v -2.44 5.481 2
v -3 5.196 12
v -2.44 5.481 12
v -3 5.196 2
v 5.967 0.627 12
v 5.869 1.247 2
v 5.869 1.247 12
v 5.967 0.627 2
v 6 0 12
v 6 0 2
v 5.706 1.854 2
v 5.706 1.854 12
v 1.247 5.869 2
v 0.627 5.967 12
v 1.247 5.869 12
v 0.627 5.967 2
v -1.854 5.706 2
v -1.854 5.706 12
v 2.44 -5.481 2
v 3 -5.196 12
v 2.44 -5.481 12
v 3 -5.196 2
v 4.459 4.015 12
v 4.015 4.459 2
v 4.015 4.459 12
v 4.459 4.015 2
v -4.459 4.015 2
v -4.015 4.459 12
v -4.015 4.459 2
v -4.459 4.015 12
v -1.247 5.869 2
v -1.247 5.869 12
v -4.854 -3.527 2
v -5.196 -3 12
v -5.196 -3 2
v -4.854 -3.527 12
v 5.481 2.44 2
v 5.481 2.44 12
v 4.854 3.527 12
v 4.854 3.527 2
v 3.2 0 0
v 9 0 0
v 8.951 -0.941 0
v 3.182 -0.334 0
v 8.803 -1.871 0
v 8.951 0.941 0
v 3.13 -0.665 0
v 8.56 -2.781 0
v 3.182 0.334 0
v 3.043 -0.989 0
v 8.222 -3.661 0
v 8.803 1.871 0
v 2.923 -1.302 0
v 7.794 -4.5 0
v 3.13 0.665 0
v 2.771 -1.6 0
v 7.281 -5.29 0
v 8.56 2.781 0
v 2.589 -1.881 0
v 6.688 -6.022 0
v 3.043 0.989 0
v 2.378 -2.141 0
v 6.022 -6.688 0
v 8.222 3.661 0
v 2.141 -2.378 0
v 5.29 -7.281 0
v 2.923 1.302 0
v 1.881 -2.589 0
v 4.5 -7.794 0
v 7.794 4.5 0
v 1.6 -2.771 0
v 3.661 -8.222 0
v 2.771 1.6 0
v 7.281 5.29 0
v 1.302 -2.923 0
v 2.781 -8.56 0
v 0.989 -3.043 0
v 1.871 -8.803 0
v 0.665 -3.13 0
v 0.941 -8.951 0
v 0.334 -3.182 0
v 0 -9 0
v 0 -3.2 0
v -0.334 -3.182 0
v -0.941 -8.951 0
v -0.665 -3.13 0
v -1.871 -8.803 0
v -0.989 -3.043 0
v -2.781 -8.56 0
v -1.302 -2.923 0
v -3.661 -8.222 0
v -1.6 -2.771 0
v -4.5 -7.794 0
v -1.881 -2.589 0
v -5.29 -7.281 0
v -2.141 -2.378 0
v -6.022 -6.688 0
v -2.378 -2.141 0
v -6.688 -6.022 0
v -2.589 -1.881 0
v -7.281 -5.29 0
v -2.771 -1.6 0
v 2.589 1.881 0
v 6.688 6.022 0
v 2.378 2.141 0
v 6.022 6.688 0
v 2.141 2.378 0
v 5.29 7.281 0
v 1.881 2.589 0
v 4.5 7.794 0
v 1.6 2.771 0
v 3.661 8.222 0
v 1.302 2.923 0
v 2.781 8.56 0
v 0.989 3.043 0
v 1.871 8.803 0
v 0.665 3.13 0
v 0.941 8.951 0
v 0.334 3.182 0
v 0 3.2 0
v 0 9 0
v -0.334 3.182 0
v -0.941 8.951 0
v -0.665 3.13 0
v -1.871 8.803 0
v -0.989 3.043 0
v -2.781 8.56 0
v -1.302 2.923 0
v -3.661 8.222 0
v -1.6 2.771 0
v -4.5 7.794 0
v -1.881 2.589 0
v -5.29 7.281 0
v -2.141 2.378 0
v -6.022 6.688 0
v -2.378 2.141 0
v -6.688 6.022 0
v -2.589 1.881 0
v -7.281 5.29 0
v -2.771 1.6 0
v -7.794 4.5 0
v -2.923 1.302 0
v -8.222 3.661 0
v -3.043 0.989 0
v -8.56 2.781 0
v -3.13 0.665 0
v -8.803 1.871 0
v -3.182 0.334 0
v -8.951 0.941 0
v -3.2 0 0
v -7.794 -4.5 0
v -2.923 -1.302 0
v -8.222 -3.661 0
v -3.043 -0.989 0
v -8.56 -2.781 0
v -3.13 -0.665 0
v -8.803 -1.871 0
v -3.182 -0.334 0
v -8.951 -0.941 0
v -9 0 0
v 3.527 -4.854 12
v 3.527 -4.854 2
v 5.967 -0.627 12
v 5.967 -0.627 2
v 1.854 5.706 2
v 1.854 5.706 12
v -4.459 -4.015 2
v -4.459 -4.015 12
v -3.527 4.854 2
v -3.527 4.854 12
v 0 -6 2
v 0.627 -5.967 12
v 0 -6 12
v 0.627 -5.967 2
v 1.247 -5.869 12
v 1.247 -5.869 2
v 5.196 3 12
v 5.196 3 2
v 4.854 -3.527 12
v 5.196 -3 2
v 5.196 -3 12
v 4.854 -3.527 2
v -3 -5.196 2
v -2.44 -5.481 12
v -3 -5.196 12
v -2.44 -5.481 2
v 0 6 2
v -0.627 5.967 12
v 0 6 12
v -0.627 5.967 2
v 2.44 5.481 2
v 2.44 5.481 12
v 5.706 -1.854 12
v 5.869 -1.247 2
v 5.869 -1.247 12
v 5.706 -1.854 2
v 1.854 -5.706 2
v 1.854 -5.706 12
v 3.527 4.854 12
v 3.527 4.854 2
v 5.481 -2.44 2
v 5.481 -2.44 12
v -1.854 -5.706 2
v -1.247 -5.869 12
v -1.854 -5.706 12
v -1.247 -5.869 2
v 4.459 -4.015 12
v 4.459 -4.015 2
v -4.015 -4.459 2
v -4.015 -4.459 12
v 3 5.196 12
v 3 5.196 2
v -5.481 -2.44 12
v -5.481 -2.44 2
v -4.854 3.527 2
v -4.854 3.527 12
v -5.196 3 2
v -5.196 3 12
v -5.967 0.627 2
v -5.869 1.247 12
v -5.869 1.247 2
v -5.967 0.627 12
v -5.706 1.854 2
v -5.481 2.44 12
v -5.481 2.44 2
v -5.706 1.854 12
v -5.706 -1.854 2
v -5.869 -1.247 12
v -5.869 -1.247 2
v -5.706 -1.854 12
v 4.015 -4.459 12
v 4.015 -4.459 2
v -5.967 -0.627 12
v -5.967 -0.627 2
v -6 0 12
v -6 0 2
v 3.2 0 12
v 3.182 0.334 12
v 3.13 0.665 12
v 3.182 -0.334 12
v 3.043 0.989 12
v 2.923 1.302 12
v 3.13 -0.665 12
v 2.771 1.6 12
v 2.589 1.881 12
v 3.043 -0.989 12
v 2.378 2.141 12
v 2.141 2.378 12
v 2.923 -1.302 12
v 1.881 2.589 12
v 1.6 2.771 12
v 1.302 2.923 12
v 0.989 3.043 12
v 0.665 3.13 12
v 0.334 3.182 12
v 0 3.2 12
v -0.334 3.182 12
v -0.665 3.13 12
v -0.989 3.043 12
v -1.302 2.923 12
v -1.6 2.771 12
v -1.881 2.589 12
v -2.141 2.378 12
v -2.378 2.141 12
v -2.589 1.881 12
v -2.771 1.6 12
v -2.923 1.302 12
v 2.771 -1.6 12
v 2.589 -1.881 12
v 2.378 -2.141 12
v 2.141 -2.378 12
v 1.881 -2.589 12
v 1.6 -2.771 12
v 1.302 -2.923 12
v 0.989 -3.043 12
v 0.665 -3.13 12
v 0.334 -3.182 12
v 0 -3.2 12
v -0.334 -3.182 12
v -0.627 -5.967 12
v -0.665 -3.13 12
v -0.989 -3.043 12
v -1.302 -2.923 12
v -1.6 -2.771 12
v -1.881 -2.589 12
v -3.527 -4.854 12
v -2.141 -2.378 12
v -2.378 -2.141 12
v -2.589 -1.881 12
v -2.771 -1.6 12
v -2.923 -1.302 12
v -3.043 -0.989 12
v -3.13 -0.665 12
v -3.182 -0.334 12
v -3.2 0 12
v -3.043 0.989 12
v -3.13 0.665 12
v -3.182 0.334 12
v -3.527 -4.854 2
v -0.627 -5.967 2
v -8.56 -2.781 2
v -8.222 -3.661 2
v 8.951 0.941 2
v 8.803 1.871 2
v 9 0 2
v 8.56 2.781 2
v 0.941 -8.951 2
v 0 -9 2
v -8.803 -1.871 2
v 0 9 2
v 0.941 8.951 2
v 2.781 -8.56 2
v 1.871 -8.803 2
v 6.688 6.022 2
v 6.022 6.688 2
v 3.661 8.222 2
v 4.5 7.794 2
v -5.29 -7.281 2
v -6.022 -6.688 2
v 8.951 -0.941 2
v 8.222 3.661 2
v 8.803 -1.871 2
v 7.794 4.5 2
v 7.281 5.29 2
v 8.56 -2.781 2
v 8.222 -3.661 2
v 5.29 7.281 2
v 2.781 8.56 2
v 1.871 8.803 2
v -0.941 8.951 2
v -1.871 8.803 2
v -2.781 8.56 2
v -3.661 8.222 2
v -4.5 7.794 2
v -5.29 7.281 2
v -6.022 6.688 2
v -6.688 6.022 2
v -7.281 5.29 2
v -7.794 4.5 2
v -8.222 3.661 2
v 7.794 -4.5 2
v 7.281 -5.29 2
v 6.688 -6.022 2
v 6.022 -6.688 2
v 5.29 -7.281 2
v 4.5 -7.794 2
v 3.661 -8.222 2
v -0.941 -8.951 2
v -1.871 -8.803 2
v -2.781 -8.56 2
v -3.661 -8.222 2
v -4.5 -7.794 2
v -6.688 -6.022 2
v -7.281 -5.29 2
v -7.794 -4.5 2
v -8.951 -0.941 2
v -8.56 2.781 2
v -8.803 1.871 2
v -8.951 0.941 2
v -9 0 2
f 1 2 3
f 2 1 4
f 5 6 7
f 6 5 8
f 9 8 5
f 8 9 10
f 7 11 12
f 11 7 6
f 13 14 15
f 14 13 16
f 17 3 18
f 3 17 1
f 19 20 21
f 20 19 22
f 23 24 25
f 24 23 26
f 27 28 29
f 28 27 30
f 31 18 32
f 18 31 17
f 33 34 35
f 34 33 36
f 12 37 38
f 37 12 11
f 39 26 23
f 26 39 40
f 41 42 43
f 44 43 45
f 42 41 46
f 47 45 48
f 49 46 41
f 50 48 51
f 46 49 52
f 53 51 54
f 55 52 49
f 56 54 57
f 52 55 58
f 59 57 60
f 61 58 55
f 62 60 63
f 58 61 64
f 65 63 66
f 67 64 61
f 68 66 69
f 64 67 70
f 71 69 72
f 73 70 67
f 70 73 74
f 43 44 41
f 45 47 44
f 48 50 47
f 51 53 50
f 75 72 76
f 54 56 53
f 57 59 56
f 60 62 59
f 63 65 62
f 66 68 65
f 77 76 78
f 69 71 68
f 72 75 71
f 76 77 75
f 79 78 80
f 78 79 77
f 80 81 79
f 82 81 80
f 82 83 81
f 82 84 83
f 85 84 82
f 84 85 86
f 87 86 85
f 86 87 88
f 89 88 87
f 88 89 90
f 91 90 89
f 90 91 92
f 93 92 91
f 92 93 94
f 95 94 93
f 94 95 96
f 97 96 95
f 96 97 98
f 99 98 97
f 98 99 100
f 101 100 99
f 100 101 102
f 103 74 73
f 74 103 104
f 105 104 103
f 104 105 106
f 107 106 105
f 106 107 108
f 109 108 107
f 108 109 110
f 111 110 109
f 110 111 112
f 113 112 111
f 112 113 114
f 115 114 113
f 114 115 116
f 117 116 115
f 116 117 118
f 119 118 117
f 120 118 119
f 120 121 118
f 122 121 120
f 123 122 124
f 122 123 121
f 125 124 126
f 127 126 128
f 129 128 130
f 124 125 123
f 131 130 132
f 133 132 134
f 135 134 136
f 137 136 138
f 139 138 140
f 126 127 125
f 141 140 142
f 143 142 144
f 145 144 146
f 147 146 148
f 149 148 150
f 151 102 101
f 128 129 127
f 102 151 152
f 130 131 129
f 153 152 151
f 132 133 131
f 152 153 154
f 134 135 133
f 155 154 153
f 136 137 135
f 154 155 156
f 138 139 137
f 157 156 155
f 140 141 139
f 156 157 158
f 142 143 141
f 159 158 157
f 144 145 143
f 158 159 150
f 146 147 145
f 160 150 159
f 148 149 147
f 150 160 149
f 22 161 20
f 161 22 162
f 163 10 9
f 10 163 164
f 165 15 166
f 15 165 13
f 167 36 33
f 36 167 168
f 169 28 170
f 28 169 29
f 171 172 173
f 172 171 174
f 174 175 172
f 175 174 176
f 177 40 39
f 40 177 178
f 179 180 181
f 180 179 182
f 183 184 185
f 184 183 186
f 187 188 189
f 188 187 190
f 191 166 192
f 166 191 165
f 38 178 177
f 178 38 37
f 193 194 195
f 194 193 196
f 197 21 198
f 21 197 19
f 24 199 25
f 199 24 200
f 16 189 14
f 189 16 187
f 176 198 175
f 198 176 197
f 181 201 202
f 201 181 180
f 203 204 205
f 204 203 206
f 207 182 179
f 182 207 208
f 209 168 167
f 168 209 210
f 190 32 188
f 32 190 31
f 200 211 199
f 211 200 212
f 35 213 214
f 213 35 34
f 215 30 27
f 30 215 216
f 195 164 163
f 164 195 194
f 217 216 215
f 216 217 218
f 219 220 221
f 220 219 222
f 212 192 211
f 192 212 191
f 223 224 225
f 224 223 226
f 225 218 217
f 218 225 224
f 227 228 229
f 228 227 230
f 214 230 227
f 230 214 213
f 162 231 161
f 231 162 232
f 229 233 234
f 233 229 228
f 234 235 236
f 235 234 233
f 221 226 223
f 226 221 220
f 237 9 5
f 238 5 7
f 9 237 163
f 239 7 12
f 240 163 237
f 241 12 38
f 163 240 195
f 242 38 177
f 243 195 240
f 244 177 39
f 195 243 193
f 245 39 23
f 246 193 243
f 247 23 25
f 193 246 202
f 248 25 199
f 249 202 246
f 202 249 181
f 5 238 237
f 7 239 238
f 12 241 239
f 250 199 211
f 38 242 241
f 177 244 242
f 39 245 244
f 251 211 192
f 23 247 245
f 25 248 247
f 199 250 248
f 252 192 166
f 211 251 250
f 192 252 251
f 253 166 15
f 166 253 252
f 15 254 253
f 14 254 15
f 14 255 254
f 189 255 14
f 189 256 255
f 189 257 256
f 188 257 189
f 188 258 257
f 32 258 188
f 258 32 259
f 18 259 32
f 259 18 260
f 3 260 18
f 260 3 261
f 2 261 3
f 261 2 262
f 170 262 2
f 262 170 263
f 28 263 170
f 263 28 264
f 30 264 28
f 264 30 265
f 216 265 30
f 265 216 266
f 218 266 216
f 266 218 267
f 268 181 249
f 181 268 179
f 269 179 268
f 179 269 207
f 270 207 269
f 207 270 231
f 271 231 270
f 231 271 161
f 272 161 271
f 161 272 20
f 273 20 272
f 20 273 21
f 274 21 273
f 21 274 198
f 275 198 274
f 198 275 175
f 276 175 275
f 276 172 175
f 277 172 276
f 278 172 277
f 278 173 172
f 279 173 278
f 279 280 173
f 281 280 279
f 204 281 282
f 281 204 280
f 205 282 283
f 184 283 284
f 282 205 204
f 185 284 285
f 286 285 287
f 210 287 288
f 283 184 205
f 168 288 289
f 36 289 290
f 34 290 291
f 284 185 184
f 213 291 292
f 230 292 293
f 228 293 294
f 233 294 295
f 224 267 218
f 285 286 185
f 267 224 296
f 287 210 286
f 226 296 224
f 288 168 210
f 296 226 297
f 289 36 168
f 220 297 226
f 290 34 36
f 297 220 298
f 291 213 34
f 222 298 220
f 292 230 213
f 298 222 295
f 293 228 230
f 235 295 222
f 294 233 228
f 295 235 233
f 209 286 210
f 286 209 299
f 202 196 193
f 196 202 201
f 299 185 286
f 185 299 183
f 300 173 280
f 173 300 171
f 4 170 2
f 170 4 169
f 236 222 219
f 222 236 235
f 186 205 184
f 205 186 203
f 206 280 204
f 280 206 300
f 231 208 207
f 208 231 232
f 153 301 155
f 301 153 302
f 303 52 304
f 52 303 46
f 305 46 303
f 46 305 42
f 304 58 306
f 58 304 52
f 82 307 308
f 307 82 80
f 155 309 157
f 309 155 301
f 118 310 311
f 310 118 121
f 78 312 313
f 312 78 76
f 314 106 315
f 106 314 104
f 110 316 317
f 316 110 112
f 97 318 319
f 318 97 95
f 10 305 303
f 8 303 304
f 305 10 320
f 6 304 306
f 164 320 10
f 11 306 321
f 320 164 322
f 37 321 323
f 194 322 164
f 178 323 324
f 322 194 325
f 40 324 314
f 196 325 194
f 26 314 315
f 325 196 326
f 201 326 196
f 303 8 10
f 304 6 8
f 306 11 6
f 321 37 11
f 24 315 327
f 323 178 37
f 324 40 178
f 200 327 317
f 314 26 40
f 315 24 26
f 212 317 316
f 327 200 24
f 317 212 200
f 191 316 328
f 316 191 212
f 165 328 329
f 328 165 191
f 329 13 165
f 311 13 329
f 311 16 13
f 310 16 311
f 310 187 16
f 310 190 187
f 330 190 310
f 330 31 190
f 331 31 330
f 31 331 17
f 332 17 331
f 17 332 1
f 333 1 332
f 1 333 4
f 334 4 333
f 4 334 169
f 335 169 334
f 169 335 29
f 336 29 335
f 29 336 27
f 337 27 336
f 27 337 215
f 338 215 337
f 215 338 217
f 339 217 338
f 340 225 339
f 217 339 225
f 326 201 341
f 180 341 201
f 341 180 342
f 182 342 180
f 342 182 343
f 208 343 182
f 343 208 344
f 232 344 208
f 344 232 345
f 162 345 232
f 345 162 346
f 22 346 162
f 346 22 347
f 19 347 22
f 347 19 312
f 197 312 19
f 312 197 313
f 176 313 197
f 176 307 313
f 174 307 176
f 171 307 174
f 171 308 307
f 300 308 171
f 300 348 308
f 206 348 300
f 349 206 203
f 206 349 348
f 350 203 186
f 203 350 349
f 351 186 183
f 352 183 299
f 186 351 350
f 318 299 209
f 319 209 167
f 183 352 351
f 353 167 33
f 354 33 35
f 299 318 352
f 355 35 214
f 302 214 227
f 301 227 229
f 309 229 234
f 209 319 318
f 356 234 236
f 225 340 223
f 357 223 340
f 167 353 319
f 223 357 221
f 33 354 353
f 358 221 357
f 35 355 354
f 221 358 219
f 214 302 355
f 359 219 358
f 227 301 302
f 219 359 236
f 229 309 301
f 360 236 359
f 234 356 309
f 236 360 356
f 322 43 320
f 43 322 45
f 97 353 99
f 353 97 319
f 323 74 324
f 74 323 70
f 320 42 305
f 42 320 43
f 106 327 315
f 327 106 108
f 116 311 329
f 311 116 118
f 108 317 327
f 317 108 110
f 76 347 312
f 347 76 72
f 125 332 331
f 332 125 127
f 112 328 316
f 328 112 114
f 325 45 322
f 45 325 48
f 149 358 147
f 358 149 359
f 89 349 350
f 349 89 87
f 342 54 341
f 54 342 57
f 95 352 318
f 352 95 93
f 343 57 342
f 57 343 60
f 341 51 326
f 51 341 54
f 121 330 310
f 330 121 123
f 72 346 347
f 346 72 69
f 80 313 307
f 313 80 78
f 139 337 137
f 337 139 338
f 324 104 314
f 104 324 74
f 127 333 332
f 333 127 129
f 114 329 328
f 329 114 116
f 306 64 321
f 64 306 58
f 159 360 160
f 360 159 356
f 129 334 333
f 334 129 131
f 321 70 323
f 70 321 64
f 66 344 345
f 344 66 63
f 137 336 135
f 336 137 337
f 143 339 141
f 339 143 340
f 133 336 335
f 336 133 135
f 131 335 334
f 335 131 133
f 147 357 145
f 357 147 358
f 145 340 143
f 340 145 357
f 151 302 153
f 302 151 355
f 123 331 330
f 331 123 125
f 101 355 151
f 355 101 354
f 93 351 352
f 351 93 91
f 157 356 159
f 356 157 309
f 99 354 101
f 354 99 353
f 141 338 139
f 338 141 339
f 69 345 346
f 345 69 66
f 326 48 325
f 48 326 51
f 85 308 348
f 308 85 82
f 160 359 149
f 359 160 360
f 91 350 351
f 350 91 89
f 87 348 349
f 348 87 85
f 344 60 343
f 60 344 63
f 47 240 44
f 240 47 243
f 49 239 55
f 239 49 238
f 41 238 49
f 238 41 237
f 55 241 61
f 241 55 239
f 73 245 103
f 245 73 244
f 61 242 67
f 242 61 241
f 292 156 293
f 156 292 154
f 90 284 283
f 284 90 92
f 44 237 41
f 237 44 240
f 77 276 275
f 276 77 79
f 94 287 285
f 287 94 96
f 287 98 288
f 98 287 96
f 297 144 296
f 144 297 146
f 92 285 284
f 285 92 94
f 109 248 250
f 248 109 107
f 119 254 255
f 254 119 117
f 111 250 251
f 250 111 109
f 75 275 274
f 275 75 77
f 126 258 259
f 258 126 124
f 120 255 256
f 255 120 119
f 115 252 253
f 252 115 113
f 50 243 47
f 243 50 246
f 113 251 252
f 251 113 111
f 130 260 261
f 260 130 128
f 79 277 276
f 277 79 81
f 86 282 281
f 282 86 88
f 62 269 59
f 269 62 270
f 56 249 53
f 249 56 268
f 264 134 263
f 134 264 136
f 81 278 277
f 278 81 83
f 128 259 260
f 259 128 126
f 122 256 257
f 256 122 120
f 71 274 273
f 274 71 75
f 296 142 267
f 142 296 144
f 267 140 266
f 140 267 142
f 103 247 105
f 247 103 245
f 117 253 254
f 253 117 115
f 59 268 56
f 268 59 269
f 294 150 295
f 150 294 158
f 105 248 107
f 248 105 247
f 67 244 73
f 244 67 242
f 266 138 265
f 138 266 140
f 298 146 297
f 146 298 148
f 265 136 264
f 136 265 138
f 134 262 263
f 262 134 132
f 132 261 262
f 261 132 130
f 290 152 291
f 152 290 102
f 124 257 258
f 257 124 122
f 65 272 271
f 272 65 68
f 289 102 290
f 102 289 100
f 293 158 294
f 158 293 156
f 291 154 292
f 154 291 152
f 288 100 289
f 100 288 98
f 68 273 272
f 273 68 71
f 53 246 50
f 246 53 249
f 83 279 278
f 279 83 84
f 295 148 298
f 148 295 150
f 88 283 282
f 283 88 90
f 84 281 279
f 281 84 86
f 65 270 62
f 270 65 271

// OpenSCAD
// Rivet nut / nutsert.
$fn = 60;
eps = 0.02;
thread_d = 6.4;
outer_d = 12;
length = 12;
flange_d = 18;
difference() { union() { cylinder(d=max(outer_d, thread_d+3),h=length); cylinder(d=max(flange_d, thread_d+6),h=2); } translate([0,0,-eps]) cylinder(d=thread_d,h=length+2*eps); }
